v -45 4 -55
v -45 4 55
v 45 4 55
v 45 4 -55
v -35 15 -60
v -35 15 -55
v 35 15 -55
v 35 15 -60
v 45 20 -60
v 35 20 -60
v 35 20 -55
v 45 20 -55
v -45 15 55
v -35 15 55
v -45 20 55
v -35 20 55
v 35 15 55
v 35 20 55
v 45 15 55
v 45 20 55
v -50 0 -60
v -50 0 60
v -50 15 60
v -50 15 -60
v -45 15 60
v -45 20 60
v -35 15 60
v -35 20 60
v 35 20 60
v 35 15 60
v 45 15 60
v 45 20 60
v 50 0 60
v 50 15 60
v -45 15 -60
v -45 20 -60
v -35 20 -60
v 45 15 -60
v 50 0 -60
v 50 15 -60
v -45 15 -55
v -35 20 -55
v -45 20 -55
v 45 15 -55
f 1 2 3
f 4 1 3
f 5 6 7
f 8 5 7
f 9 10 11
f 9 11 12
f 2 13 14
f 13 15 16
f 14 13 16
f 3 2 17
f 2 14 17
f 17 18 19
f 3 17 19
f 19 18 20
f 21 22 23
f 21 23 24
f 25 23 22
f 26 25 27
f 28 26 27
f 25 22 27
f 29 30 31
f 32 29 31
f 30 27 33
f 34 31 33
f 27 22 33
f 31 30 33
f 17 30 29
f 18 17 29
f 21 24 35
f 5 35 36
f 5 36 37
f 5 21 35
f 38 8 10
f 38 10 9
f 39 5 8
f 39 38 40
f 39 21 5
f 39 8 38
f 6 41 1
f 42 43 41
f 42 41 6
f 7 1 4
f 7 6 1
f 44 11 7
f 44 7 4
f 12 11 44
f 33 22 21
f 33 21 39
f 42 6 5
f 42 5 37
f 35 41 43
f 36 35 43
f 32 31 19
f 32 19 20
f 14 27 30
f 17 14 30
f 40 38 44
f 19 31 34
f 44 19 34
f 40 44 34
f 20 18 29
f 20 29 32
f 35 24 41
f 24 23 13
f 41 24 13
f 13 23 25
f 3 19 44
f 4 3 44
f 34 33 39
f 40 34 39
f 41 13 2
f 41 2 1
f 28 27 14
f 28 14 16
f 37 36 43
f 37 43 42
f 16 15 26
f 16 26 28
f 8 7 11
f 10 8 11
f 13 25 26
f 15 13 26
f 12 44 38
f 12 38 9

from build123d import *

# Parameters (mm, degrees)
SKETCH1_W           = 100
SKETCH1_H           = 120
BOSS_EXTRUDE1_DEPTH = 20
SKETCH2_W           = 90
SKETCH2_H           = 110
CUT_EXTRUDE1_DEPTH  = 16
SKETCH4_W           = 5
SKETCH4_H           = 5
SKETCH4_W_2         = 70
CUT_EXTRUDE2_DEPTH  = 121


with BuildPart() as part:
    # Sketch1 → Boss-Extrude1 (new body)
    with BuildSketch(Plane(origin=(0, 0, 0), x_dir=(1, 0, 0), z_dir=(0, 1, 0))):
        Rectangle(SKETCH1_W, SKETCH1_H)
    extrude(amount=BOSS_EXTRUDE1_DEPTH)

    # Sketch2 → Cut-Extrude1 (cut)
    with BuildSketch(Plane(origin=(0, 20, 0), x_dir=(1, 0, 0), z_dir=(0, 1, 0))):
        Rectangle(SKETCH2_W, SKETCH2_H)
    extrude(amount=-CUT_EXTRUDE1_DEPTH, mode=Mode.SUBTRACT)

    # Sketch4 → Cut-Extrude2 (cut, through all)
    with BuildSketch(Plane.XY.offset(60)):
        with Locations((-47.5, 17.5)):
            Rectangle(SKETCH4_W, SKETCH4_H)
        with Locations((47.5, 17.5)):
            Rectangle(SKETCH4_W, SKETCH4_H)
        with Locations((0, 17.5)):
            Rectangle(SKETCH4_W_2, SKETCH4_H)
    extrude(amount=-CUT_EXTRUDE2_DEPTH, mode=Mode.SUBTRACT)


solid = part.part
